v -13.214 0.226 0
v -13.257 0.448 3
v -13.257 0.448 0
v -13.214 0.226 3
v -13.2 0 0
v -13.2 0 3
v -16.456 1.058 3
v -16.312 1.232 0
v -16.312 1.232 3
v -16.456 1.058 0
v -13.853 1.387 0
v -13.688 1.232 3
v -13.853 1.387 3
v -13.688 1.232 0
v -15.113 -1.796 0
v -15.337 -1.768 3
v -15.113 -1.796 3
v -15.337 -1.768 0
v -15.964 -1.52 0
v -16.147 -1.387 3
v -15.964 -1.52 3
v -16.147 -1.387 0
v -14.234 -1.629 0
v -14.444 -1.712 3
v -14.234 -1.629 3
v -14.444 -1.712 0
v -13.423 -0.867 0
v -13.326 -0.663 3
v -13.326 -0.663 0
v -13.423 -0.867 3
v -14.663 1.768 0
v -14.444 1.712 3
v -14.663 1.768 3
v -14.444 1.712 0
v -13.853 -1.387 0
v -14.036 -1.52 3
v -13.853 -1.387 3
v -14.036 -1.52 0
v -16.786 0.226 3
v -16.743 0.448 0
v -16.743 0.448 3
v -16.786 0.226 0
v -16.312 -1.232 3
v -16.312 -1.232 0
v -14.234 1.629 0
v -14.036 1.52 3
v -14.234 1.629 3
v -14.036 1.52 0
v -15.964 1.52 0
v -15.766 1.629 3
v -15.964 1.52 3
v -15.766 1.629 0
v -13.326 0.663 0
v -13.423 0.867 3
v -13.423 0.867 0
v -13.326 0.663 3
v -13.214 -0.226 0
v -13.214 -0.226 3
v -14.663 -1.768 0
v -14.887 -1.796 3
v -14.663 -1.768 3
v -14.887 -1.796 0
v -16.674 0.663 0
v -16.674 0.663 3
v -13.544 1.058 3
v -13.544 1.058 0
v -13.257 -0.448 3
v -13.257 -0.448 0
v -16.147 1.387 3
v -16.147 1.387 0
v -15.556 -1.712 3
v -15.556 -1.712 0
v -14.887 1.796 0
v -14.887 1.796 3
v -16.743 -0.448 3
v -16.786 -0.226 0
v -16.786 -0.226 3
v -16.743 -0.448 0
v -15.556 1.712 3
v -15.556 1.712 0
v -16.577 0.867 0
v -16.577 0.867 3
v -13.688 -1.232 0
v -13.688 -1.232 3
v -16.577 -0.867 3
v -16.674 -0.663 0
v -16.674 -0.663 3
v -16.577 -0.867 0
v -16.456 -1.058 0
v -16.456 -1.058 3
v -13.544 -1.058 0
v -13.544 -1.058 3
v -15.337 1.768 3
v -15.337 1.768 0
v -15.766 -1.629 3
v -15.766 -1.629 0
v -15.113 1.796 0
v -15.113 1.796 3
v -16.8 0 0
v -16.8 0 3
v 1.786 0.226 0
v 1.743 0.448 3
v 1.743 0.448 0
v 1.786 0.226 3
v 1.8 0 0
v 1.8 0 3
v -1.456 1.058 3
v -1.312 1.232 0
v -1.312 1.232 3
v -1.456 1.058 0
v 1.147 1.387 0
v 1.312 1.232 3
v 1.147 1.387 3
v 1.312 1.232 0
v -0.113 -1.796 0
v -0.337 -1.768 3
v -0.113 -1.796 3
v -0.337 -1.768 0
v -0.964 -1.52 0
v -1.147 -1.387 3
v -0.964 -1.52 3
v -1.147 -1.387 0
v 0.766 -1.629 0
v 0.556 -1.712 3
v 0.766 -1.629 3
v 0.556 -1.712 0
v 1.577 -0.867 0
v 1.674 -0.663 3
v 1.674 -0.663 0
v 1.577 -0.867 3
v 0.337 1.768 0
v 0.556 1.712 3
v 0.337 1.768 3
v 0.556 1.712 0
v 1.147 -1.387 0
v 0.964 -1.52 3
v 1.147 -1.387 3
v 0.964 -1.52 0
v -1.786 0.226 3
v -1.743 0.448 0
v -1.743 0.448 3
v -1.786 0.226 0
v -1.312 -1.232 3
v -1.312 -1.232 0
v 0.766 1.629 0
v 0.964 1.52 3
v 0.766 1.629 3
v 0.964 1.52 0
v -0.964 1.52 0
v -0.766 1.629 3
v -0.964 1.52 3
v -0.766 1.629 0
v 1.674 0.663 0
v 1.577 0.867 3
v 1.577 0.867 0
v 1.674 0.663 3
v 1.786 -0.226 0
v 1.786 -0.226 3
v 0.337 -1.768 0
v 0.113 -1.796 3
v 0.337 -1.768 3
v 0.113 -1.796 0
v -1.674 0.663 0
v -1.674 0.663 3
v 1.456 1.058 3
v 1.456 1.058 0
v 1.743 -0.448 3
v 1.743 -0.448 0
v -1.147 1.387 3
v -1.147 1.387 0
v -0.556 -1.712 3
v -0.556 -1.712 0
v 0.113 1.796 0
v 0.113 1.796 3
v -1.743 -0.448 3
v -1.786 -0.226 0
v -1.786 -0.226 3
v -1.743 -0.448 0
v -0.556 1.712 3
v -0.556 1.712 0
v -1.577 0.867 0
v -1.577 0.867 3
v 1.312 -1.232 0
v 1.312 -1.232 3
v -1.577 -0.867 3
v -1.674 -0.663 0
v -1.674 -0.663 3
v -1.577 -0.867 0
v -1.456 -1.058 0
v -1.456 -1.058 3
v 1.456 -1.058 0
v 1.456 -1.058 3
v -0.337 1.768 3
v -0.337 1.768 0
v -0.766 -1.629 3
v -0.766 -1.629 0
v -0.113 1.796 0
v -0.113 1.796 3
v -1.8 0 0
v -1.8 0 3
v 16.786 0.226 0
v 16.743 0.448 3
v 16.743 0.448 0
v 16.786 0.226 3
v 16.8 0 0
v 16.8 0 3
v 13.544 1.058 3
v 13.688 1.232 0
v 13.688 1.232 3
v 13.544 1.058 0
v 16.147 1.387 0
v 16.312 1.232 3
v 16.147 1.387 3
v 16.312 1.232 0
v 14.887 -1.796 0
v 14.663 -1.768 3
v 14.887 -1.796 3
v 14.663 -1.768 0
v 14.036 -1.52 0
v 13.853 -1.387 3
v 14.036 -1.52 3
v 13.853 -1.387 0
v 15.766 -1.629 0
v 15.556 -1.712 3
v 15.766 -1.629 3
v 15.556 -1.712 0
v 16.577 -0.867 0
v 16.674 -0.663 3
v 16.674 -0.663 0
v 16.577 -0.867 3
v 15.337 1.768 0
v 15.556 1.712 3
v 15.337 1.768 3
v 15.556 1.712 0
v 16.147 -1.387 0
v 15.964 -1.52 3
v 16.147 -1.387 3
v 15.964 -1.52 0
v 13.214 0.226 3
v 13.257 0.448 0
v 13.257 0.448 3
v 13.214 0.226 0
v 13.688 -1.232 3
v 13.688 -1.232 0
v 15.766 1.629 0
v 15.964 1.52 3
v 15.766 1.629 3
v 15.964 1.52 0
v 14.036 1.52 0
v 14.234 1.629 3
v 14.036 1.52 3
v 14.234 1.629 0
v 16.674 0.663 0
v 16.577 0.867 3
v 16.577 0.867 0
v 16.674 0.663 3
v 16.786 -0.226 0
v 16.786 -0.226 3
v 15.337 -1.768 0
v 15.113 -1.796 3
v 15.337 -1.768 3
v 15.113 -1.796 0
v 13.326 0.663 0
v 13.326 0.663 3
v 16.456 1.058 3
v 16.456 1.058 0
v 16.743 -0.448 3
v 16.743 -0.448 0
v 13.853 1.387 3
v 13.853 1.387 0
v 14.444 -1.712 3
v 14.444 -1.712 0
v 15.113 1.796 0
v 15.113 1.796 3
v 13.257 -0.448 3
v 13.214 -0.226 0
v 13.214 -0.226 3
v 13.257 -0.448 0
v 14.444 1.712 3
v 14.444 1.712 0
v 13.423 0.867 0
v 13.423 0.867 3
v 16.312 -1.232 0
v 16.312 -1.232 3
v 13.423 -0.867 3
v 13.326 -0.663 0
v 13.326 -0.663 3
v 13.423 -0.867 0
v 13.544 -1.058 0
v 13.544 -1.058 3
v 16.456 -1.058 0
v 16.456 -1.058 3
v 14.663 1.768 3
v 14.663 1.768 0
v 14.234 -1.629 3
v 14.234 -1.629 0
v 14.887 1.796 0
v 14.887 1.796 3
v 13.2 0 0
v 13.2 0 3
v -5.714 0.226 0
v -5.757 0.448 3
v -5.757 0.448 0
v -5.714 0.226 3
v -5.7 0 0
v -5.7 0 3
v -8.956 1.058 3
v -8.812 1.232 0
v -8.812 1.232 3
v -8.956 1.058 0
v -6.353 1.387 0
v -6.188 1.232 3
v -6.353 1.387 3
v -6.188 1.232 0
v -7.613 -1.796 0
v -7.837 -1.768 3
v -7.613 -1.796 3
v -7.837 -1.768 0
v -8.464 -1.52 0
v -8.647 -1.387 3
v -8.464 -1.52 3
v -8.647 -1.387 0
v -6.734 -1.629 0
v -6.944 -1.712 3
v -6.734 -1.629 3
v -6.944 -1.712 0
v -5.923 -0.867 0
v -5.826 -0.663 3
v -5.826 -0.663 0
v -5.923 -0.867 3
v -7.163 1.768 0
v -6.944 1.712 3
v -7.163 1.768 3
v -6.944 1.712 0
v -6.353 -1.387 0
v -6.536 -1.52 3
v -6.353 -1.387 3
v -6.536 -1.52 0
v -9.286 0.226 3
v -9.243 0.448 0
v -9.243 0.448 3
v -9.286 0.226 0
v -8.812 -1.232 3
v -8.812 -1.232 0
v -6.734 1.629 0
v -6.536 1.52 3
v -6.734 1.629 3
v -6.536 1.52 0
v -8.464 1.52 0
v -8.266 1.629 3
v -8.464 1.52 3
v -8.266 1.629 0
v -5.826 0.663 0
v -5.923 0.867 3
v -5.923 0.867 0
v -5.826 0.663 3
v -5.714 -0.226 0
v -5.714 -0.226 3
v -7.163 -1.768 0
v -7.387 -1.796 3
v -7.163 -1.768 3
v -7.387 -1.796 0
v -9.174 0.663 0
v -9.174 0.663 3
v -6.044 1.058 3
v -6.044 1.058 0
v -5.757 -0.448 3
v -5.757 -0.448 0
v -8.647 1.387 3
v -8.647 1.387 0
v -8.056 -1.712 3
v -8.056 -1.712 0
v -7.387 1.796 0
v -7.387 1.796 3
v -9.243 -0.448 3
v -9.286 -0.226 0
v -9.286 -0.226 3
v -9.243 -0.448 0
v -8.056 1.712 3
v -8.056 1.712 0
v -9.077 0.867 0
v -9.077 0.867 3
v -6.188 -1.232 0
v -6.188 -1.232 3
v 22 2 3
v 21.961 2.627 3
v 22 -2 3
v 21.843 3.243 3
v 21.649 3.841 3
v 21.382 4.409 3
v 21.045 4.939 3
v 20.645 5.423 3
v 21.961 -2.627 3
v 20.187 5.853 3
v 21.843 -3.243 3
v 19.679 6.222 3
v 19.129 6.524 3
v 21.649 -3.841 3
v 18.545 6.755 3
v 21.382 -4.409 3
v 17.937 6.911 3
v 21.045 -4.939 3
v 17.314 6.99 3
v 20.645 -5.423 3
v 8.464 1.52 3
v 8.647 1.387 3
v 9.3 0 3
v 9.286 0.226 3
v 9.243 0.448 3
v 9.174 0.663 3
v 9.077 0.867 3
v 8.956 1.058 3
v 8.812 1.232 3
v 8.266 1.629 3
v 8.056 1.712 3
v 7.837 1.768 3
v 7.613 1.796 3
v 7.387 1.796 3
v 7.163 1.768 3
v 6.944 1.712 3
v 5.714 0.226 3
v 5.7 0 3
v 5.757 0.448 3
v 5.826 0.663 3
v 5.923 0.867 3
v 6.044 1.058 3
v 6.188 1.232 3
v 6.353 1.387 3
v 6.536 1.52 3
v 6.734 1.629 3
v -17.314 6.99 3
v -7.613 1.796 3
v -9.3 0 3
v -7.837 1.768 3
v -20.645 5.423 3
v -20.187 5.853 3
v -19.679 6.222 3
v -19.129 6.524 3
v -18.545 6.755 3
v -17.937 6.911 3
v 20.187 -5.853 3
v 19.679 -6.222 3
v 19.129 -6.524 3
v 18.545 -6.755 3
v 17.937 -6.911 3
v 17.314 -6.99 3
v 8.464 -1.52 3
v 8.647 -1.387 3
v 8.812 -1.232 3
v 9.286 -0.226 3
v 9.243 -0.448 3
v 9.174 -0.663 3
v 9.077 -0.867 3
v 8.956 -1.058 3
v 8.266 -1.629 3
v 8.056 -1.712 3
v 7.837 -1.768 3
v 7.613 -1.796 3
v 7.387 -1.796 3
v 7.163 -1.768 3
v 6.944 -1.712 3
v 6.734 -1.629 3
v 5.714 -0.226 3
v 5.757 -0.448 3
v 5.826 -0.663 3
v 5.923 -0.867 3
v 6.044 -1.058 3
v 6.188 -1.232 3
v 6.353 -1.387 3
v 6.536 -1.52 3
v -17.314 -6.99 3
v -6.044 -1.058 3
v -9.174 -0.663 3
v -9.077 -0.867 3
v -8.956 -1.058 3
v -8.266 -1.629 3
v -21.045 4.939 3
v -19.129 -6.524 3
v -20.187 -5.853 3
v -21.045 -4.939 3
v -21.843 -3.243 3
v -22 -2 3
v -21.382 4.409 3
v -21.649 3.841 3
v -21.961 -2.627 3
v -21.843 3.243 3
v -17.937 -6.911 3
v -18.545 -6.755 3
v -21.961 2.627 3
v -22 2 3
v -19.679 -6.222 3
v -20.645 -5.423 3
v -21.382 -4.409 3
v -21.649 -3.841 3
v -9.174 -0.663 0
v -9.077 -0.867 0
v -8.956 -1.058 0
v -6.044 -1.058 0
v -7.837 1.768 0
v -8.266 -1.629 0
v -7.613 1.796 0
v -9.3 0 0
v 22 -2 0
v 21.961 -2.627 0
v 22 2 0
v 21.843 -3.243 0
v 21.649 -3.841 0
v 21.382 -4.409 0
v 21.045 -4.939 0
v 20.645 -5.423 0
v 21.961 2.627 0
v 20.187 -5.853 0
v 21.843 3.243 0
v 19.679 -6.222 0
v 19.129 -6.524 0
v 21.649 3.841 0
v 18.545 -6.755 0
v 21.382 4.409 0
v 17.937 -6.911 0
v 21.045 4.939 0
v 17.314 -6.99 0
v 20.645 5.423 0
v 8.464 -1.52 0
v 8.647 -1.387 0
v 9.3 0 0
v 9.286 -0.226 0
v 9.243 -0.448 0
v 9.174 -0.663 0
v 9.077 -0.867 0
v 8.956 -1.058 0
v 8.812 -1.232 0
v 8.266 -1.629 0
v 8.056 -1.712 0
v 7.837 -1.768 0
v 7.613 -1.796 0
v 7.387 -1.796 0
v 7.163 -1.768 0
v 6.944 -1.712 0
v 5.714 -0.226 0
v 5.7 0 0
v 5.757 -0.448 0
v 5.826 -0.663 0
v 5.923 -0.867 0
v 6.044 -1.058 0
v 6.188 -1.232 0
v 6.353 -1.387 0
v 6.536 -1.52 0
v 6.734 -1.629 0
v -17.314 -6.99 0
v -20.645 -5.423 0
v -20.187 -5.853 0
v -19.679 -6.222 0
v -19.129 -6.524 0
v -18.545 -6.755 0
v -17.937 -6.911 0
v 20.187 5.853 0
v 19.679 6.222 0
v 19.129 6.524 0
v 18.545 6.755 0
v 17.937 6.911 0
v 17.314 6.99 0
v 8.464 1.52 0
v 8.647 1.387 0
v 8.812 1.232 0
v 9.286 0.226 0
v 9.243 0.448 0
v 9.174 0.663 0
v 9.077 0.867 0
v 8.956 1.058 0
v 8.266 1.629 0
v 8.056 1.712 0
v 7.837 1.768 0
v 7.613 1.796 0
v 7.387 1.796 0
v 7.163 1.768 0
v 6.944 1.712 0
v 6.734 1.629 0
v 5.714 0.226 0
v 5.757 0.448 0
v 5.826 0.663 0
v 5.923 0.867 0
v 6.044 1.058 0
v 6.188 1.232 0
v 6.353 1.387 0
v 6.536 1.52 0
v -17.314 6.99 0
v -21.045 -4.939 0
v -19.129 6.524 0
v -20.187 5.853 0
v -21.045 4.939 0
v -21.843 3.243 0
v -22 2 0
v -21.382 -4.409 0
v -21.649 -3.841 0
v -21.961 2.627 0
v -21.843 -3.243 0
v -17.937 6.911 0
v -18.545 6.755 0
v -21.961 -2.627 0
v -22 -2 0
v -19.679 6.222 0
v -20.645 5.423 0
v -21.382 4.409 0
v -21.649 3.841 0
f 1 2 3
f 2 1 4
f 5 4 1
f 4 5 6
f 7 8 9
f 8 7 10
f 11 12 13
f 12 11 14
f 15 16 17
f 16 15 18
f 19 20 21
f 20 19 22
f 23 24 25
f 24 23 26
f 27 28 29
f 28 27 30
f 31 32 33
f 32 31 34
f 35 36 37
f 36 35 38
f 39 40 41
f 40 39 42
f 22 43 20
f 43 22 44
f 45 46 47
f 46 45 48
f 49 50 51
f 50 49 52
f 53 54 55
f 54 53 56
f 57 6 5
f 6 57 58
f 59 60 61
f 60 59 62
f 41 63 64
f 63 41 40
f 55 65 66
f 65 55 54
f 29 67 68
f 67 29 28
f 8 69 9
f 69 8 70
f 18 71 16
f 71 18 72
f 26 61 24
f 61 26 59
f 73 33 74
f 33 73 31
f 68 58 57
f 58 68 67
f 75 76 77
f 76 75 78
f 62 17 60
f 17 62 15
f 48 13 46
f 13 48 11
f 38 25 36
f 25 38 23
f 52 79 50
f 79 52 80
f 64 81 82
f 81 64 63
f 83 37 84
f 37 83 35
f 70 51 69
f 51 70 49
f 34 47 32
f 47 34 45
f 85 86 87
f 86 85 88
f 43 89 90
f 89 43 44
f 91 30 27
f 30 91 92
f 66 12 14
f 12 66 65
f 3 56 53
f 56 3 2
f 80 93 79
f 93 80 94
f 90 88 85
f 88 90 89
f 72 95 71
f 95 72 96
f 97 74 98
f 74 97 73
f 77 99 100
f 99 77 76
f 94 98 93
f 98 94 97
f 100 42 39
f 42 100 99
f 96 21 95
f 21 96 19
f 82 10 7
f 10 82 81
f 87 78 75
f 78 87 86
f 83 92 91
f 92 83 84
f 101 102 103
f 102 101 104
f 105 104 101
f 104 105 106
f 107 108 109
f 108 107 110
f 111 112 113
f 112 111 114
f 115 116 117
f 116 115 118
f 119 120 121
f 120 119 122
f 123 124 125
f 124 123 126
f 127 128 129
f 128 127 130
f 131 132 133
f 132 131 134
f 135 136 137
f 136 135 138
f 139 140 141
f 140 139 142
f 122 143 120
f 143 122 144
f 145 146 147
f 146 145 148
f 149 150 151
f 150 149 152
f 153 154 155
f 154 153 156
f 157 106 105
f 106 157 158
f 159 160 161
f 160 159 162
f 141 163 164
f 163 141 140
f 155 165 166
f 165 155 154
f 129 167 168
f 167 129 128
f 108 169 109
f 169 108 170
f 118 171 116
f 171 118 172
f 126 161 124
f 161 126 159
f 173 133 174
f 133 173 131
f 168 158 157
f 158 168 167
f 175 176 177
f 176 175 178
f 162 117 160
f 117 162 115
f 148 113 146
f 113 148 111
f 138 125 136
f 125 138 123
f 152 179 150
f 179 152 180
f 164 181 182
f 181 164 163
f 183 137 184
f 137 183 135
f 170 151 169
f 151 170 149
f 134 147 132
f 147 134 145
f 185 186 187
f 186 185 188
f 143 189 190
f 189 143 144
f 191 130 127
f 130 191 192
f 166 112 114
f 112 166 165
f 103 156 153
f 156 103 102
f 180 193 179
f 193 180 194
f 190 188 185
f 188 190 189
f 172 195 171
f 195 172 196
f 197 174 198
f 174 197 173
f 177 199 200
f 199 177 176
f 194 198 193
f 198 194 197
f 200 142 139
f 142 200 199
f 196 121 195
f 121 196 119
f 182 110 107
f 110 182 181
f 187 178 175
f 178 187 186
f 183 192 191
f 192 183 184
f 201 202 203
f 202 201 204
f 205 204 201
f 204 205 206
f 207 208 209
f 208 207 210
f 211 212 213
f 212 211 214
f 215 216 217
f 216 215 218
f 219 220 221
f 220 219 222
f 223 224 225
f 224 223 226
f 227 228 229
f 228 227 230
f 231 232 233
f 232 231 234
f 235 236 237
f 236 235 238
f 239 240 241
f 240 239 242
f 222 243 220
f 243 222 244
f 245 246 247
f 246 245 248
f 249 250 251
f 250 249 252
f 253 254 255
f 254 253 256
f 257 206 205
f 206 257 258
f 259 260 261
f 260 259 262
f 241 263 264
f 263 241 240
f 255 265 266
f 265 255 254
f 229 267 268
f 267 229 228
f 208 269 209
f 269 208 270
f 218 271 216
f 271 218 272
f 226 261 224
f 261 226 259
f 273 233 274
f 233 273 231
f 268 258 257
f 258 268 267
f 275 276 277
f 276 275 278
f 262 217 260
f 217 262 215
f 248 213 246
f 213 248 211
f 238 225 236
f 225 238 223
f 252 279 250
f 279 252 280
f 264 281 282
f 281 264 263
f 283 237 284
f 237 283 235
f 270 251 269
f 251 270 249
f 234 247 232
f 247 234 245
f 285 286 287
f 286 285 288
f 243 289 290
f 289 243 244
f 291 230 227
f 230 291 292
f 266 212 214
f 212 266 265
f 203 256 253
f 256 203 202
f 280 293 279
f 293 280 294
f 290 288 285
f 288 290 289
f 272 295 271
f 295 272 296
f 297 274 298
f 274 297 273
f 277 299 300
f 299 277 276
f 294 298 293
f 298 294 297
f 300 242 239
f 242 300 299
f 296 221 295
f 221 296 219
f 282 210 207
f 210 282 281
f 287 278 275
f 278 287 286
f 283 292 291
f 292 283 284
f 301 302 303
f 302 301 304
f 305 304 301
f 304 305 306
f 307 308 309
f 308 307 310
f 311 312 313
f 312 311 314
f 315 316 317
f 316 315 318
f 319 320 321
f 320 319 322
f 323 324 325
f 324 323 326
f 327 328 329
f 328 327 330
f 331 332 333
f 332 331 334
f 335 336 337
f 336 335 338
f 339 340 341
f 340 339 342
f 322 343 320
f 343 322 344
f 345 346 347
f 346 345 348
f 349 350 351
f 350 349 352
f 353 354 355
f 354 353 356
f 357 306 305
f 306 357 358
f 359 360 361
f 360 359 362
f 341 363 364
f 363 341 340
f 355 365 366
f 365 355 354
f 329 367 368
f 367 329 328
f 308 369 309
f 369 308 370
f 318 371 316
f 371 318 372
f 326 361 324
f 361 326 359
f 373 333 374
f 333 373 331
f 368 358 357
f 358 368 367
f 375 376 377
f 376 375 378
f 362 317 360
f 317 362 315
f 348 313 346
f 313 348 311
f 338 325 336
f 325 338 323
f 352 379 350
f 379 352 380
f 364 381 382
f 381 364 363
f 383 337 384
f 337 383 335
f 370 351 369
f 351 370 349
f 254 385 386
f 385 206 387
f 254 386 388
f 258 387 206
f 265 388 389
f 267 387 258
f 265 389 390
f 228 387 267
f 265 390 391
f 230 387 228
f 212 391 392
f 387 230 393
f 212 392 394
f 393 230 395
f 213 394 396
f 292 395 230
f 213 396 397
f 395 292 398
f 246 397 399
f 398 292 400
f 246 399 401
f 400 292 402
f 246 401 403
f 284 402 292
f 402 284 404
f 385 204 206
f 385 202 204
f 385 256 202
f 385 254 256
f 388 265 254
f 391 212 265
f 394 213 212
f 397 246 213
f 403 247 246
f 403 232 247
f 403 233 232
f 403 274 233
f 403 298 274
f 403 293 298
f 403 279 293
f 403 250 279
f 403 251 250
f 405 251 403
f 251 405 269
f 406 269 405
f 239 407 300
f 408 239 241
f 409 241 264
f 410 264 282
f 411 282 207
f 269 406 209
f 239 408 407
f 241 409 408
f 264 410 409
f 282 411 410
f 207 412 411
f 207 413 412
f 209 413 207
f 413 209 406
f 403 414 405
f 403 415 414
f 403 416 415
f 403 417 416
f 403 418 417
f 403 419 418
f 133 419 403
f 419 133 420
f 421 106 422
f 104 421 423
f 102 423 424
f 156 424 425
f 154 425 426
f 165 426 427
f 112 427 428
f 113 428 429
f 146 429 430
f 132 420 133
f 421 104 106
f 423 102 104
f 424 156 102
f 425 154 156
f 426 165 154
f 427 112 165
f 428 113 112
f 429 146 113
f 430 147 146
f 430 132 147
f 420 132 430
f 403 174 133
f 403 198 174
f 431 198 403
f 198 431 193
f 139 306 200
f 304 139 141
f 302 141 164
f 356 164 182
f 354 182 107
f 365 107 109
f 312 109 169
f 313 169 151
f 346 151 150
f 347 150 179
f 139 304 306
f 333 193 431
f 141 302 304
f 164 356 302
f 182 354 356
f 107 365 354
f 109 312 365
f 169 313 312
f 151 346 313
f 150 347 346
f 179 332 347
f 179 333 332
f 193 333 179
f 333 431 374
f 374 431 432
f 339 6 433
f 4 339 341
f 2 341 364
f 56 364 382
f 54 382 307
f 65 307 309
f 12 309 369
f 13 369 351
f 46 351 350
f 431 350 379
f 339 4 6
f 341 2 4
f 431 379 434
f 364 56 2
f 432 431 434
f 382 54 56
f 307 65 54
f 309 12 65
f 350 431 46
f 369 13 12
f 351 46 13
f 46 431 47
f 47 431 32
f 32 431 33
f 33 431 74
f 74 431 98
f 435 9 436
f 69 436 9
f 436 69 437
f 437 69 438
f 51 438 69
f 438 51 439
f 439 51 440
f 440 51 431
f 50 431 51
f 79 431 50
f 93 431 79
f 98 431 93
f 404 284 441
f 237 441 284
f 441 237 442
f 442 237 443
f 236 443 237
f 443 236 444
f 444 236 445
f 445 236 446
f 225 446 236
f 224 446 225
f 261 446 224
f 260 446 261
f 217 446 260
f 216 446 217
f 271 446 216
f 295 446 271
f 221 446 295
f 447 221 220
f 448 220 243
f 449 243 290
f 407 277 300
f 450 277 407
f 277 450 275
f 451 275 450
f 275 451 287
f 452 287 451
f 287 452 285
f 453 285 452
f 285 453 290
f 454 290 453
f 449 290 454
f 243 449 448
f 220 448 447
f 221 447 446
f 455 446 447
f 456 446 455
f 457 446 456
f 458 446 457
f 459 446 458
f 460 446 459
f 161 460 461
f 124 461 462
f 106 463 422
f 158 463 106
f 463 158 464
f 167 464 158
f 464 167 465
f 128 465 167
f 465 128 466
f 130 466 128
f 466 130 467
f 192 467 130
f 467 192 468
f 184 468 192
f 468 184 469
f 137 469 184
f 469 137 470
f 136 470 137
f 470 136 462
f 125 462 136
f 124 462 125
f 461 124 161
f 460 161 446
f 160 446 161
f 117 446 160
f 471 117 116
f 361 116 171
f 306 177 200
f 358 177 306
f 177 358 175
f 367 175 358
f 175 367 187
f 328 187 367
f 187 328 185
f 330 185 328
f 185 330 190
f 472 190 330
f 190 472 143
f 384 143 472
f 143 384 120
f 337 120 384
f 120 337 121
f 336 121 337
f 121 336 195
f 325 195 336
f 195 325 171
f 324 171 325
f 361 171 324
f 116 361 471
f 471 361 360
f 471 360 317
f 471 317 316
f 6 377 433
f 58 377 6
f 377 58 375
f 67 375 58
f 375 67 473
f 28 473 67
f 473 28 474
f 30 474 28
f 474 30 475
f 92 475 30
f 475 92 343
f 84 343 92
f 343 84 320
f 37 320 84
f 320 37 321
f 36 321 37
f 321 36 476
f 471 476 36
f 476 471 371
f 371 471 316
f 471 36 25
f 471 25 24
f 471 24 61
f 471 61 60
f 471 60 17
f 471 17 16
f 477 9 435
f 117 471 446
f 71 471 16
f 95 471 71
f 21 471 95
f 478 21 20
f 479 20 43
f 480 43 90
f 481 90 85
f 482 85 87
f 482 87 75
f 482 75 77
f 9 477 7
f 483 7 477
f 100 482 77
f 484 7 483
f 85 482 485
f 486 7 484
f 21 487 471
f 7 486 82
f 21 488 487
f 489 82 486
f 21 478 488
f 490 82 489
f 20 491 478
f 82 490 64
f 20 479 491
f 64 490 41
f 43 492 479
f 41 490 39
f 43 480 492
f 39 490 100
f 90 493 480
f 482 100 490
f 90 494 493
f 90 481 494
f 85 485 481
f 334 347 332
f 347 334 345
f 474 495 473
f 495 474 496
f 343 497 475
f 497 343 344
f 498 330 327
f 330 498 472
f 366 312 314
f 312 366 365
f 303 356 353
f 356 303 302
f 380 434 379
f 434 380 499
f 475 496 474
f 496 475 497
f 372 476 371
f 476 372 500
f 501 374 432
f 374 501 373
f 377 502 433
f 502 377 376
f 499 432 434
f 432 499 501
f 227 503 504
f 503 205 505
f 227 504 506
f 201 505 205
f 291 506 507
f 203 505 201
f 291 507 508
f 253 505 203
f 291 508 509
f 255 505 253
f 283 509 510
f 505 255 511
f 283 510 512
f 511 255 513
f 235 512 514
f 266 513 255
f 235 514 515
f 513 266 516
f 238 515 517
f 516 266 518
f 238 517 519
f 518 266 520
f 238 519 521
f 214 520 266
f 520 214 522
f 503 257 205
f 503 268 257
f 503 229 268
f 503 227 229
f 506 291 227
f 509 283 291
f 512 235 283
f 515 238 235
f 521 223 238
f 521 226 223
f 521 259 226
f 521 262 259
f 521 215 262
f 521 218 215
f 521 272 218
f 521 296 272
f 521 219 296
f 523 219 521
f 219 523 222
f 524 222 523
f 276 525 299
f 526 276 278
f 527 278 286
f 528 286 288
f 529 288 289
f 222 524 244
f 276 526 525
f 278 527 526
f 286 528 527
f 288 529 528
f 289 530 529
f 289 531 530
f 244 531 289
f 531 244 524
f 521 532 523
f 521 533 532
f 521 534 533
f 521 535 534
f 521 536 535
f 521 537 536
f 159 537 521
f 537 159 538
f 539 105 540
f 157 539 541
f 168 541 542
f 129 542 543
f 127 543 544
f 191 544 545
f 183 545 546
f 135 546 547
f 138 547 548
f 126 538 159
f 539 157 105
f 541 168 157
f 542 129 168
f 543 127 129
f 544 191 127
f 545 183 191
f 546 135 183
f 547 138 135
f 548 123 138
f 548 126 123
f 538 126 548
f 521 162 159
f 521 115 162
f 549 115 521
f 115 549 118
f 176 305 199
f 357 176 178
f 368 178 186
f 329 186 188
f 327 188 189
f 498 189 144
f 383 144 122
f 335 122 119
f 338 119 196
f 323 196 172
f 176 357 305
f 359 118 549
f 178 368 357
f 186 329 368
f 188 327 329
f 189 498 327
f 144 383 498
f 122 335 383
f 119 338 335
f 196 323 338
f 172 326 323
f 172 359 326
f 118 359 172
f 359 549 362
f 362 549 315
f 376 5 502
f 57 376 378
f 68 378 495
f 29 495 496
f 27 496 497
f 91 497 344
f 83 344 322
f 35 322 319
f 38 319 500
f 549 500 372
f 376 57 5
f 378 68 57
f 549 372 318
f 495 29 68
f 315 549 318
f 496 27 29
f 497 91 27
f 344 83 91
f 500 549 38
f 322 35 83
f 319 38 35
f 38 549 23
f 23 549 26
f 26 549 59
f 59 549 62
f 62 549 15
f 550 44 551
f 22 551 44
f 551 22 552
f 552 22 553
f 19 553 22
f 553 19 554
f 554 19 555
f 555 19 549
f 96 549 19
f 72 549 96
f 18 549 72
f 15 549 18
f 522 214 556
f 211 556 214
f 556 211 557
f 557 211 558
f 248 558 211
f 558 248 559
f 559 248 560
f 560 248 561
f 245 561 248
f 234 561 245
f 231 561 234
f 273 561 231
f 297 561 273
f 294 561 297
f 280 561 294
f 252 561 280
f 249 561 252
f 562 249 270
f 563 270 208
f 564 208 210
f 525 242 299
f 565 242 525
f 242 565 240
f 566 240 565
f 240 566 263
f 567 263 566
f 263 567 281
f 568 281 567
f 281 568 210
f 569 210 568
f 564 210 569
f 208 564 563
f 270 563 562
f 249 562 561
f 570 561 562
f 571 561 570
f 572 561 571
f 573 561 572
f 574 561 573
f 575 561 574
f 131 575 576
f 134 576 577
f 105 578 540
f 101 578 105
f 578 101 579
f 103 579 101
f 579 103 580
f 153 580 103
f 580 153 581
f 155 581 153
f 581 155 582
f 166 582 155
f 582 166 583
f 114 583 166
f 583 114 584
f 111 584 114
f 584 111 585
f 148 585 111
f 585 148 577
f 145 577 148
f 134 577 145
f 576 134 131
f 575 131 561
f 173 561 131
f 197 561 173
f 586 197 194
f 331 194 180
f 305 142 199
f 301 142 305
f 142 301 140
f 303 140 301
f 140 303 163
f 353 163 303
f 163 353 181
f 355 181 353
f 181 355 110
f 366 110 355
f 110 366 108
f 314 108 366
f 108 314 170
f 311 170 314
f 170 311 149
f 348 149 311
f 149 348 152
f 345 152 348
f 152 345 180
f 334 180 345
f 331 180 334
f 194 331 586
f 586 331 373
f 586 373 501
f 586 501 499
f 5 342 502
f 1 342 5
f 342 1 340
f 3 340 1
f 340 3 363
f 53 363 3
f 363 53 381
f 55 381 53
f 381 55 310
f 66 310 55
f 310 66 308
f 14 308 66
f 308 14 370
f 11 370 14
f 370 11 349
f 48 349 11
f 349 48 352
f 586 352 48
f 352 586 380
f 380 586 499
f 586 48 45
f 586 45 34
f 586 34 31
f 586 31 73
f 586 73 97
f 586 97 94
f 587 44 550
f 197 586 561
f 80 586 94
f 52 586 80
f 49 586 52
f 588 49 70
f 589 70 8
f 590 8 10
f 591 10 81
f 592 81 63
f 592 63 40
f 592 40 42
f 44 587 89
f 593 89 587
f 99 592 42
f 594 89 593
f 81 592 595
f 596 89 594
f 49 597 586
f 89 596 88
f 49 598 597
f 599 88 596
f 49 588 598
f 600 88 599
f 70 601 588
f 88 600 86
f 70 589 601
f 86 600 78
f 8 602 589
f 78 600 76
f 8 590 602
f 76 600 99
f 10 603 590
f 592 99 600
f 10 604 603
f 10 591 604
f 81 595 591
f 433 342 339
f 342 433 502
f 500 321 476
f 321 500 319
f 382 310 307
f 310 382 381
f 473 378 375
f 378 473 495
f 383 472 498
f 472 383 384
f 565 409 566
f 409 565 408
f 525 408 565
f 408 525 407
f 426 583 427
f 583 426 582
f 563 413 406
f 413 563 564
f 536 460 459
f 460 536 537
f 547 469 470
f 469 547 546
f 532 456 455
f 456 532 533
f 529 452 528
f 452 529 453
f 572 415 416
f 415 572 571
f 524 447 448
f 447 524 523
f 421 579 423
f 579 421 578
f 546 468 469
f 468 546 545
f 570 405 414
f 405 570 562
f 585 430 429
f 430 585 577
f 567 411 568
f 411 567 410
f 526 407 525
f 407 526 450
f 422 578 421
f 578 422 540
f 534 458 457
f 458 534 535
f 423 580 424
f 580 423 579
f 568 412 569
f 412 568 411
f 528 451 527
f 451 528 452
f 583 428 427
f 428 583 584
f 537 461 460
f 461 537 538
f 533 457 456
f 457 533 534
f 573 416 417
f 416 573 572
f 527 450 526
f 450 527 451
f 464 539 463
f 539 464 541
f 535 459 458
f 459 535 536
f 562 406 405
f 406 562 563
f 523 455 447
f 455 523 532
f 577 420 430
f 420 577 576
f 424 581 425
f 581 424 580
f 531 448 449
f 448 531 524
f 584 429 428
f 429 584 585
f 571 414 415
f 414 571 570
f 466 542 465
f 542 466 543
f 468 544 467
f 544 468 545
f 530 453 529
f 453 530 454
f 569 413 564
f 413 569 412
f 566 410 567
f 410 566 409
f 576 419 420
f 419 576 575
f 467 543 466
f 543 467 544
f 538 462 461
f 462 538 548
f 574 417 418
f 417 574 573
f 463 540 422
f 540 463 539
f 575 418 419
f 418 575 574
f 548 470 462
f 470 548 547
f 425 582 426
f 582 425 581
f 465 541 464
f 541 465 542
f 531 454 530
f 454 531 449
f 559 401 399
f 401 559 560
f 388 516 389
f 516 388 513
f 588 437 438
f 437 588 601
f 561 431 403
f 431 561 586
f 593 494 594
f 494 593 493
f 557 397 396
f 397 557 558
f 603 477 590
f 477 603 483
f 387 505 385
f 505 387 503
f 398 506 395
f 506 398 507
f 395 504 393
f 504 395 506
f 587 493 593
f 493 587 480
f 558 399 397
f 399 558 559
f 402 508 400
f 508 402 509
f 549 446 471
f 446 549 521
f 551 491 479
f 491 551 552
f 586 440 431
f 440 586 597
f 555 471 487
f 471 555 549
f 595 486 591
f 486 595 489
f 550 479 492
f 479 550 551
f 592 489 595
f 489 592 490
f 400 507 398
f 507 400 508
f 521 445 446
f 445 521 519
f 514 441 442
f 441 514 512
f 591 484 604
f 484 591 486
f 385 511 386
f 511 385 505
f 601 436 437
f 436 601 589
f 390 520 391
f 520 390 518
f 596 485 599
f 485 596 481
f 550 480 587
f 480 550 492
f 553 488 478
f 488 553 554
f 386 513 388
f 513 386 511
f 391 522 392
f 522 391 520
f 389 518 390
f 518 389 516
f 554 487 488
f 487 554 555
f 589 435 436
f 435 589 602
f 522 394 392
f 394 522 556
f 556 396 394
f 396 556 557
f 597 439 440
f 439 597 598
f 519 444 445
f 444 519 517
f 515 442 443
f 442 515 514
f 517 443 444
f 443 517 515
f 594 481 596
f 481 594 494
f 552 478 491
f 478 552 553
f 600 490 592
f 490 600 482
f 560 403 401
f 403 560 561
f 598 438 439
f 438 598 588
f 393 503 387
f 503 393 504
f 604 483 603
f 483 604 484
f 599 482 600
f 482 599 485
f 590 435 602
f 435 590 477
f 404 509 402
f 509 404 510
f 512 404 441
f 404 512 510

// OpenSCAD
$fn = 50;


difference() {
	union() {
		hull() {
			translate(v = [-17.0000000000, 2.0000000000, 0]) {
				cylinder(h = 3, r = 5);
			}
			translate(v = [17.0000000000, 2.0000000000, 0]) {
				cylinder(h = 3, r = 5);
			}
			translate(v = [-17.0000000000, -2.0000000000, 0]) {
				cylinder(h = 3, r = 5);
			}
			translate(v = [17.0000000000, -2.0000000000, 0]) {
				cylinder(h = 3, r = 5);
			}
		}
	}
	union() {
		translate(v = [-15.0000000000, 0.0000000000, -100.0000000000]) {
			cylinder(h = 200, r = 1.8000000000);
		}
		translate(v = [0.0000000000, 0.0000000000, -100.0000000000]) {
			cylinder(h = 200, r = 1.8000000000);
		}
		translate(v = [15.0000000000, 0.0000000000, -100.0000000000]) {
			cylinder(h = 200, r = 1.8000000000);
		}
		translate(v = [-15.0000000000, 0.0000000000, 0]) {
			cylinder(h = 3, r = 1.8000000000);
		}
		translate(v = [-7.5000000000, 0.0000000000, 0]) {
			cylinder(h = 3, r = 1.8000000000);
		}
		cylinder(h = 3, r = 1.8000000000);
		translate(v = [7.5000000000, 0.0000000000, 0]) {
			cylinder(h = 3, r = 1.8000000000);
		}
		translate(v = [15.0000000000, 0.0000000000, 0]) {
			cylinder(h = 3, r = 1.8000000000);
		}
		translate(v = [-15.0000000000, 0.0000000000, 0]) {
			cylinder(h = 3, r = 1.8000000000);
		}
		translate(v = [-7.5000000000, 0.0000000000, 0]) {
			cylinder(h = 3, r = 1.8000000000);
		}
		cylinder(h = 3, r = 1.8000000000);
		translate(v = [7.5000000000, 0.0000000000, 0]) {
			cylinder(h = 3, r = 1.8000000000);
		}
		translate(v = [15.0000000000, 0.0000000000, 0]) {
			cylinder(h = 3, r = 1.8000000000);
		}
		translate(v = [-15.0000000000, 0.0000000000, 0]) {
			cylinder(h = 3, r = 1.8000000000);
		}
		translate(v = [-7.5000000000, 0.0000000000, 0]) {
			cylinder(h = 3, r = 1.8000000000);
		}
		cylinder(h = 3, r = 1.8000000000);
		translate(v = [7.5000000000, 0.0000000000, 0]) {
			cylinder(h = 3, r = 1.8000000000);
		}
		translate(v = [15.0000000000, 0.0000000000, 0]) {
			cylinder(h = 3, r = 1.8000000000);
		}
	}
}
